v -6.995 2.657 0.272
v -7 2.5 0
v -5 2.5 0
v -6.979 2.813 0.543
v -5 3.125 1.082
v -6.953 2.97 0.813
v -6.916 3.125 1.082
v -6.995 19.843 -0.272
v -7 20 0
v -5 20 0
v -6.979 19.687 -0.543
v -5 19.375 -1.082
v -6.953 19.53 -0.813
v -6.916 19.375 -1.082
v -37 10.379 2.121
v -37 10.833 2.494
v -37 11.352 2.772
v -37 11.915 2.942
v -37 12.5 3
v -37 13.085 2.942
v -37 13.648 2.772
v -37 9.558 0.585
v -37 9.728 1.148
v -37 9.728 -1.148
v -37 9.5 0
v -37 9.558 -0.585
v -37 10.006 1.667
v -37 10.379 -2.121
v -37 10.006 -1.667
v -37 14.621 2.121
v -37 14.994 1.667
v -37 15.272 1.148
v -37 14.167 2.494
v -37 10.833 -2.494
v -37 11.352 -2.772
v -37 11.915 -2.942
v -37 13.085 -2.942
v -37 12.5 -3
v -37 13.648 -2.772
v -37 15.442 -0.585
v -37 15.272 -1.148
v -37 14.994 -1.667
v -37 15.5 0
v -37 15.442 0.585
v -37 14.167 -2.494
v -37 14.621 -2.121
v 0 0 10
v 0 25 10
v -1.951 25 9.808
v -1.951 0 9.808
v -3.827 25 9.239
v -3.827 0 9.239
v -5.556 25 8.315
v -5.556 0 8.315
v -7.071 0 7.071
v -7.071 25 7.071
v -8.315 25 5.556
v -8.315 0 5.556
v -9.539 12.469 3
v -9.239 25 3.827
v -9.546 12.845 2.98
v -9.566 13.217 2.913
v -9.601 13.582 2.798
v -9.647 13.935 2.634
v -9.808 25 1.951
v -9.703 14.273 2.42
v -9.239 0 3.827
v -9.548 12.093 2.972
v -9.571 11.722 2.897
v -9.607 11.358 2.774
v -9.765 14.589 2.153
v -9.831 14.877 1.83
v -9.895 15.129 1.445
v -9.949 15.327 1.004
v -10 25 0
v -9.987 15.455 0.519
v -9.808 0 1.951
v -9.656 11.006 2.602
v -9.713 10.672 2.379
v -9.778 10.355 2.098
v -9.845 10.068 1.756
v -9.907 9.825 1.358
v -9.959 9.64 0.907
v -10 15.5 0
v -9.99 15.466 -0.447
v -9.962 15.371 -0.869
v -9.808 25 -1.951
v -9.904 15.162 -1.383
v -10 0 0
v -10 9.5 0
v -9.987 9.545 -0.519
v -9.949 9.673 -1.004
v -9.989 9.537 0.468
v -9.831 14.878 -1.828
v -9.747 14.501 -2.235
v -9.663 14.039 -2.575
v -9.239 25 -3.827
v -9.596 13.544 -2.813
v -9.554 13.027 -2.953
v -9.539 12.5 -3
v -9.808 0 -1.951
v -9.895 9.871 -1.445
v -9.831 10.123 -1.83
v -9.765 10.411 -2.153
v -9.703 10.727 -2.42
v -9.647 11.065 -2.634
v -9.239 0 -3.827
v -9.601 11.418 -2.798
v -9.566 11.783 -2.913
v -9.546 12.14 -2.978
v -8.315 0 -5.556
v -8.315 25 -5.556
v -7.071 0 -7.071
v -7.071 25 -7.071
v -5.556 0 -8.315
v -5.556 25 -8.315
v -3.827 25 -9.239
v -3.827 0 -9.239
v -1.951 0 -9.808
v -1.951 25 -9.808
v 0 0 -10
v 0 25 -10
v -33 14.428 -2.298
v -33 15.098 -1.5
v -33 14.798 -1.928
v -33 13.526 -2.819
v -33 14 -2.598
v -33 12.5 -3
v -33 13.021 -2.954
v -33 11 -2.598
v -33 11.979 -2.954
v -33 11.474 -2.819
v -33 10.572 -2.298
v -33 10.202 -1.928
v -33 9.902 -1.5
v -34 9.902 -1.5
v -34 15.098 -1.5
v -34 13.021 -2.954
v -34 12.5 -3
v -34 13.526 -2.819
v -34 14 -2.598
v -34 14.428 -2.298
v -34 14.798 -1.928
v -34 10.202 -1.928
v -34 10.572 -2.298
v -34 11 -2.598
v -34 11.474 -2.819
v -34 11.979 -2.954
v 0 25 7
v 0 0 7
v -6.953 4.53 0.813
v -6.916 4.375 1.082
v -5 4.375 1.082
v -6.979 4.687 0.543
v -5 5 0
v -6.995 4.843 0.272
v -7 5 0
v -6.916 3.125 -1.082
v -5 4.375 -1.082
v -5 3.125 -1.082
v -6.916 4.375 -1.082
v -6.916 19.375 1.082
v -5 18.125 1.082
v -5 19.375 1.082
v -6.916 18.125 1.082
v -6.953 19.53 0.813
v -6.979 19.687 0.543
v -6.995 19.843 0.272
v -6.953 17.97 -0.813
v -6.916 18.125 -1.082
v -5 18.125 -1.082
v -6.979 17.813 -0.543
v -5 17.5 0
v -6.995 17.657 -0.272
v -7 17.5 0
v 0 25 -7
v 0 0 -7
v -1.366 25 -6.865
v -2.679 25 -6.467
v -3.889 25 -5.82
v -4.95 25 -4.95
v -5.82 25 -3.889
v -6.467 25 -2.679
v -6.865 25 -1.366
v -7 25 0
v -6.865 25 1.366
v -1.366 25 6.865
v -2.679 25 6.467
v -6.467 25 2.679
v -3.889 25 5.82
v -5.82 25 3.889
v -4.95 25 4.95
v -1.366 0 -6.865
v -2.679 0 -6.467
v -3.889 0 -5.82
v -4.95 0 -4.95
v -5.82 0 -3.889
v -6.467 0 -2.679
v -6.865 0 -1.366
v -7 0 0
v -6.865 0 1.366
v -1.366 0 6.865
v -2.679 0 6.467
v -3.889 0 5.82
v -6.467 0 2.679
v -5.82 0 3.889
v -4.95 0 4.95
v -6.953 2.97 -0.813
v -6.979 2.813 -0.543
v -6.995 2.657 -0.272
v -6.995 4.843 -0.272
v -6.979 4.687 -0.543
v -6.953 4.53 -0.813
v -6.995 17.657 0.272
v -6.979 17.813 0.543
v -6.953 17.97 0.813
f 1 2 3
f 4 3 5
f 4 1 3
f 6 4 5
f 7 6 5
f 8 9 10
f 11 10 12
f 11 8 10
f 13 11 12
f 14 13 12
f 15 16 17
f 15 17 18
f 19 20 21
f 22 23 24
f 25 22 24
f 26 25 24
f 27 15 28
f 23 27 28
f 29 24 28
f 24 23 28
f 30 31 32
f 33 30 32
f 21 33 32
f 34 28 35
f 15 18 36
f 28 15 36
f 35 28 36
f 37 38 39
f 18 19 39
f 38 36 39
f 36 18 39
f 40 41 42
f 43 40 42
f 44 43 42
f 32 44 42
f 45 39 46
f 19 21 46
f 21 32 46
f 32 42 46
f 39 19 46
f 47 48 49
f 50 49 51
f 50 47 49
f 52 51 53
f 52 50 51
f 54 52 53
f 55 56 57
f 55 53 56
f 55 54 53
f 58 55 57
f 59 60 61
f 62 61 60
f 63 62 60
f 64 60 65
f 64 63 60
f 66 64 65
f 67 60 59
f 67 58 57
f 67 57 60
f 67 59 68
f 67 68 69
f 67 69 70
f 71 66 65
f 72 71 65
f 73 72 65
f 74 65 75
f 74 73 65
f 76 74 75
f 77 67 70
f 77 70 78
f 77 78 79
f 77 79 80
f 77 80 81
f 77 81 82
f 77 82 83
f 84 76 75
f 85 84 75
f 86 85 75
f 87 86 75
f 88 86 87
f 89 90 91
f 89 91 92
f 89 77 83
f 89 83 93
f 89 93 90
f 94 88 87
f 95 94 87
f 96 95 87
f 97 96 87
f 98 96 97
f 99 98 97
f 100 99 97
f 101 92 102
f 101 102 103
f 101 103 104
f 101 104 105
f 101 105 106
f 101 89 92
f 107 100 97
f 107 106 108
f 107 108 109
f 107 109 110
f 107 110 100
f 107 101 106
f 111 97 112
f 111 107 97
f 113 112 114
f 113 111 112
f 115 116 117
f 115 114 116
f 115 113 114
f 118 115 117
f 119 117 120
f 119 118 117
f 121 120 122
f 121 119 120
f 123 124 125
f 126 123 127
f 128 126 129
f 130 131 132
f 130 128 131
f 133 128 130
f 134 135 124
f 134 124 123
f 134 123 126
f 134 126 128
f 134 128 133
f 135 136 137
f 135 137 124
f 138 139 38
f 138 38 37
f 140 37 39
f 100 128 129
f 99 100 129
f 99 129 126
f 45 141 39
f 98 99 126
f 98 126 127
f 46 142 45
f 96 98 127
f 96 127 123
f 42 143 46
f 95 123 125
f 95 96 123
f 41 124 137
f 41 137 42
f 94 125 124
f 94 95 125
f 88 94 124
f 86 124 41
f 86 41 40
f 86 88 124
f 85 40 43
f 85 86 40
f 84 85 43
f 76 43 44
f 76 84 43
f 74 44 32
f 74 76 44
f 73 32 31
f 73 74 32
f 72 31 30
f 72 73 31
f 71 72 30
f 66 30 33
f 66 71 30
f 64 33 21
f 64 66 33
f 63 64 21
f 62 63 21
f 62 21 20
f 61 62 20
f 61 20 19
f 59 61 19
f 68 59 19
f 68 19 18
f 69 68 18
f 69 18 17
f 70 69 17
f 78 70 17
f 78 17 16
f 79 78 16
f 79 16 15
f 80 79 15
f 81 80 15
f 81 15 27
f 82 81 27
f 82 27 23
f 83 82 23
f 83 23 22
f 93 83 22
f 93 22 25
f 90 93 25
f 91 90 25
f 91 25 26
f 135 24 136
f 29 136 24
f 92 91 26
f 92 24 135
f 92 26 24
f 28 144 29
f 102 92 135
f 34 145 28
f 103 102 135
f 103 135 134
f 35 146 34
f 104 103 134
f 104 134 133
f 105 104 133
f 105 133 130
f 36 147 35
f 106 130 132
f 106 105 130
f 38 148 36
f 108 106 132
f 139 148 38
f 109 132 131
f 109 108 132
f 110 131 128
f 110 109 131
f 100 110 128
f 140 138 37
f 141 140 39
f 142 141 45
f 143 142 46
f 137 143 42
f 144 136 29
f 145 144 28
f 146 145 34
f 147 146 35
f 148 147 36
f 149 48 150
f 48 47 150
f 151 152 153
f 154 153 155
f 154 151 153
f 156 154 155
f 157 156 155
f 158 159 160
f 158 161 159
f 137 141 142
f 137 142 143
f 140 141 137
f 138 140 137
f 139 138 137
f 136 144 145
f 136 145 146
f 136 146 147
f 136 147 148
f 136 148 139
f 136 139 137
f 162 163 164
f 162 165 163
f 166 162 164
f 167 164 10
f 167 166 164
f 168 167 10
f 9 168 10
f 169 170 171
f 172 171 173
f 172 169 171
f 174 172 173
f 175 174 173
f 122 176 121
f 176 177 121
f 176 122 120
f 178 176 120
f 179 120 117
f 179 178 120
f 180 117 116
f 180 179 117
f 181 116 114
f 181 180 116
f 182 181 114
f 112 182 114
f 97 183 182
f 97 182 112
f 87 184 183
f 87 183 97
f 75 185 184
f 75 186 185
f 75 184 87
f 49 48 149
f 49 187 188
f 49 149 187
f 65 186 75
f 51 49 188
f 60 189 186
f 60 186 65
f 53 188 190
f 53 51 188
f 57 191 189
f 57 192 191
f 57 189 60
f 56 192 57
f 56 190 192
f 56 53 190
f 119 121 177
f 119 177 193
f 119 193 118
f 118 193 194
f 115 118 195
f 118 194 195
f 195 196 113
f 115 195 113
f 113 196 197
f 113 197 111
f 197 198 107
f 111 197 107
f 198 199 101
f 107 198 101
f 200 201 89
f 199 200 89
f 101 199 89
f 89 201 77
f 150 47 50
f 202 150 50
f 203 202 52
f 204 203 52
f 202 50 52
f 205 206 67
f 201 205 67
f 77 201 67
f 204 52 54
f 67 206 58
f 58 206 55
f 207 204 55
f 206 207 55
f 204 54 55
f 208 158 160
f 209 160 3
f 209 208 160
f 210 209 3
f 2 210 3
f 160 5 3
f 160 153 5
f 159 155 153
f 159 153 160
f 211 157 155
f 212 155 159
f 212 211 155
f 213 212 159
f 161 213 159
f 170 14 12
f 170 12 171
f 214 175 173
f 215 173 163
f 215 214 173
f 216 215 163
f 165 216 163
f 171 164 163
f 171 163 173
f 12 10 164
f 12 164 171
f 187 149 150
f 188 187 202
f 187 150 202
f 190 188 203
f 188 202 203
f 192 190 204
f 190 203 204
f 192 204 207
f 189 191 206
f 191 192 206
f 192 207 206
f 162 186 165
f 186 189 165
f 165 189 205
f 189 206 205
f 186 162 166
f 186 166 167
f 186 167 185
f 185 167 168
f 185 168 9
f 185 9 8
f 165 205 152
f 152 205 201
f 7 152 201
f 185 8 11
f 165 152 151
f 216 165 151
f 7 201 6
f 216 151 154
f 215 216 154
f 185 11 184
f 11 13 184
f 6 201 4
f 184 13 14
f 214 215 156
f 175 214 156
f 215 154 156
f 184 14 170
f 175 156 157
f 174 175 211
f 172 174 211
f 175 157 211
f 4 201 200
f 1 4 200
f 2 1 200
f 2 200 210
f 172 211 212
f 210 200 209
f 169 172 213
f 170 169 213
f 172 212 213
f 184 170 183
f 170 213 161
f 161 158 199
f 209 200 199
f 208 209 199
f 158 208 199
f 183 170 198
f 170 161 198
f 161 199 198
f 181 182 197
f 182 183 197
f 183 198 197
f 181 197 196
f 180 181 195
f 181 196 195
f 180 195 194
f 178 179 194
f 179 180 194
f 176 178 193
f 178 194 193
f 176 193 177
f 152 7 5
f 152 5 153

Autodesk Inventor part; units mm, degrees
ref_plane "YZ Plane" through (0, 0, 0) normal (1, 0, 0) x (0, 1, 0)
ref_plane "XZ Plane" through (0, 0, 0) normal (0, 1, 0) x (-1, 0, 0)
ref_plane "XY Plane" through (0, 0, 0) normal (0, 0, 1) x (1, 0, 0)
sketch "Sketch1" plane through (0, 0, 0) normal (0, 1, 0) x (-1, 0, 0)
  circle A0 centre (0, 0) radius 7
  circle A1 centre (0, 0) radius 10
  line L0 (0, 11.563) -> (0, -13.4764)
  point P0 (0, -7)
  point P1 (0, -10)
  point P2 (0, 10)
  point P3 (0, 7)
  dimension "d0" = 14
  dimension "d1" = 20
extrude "Extrusion1" add sketch "Sketch1" along normal blind 25 contours A0 L0 A1 picked at (8.8579, -1.261)
sketch "Sketch2" plane through (0, 25, 0) normal (0, 1, 0) x (1, 0, 0)
  arc A0 (0, 7) -> (0, -7) centre (0, 0) ccw projected
  point P0 (-7, 0)
ref_plane "Work Plane1" through (-7, 25, 0) normal (1, 0, 0) x (0, 0, -1)
sketch "Sketch3" plane through (-7, 25, 0) normal (1, 0, 0) x (0, 0, -1)
  line L0 (10, 0) -> (-10, 0) projected
  line L1 (0, 0) -> (0, -5)
  line L2 (0, -5) -> (0, -6.25)
  line L3 (0, -5) -> (1.0825, -5.625)
  line L4 (1.0825, -5.625) -> (1.0825, -6.875)
  line L5 (1.0825, -6.875) -> (0, -7.5)
  line L6 (0, -7.5) -> (-1.0825, -6.875)
  line L7 (-1.0825, -6.875) -> (-1.0825, -5.625)
  line L8 (-1.0825, -5.625) -> (0, -5)
  line L9 (0, -6.25) -> (0, -21.25)
  line L10 (0, -21.25) -> (0, -22.5)
  line L11 (0, -22.5) -> (-1.0825, -21.875)
  line L12 (-1.0825, -21.875) -> (-1.0825, -20.625)
  line L13 (-1.0825, -20.625) -> (0, -20)
  line L14 (0, -20) -> (1.0825, -20.625)
  line L15 (1.0825, -20.625) -> (1.0825, -21.875)
  line L16 (1.0825, -21.875) -> (0, -22.5)
  point P0 (0, -25)
  dimension "d4" = 5
  dimension "d5" = 1.25
  dimension "d6" = 15
  dimension "d7" = 1.25
extrude "Extrusion2" add sketch "Sketch3" along normal blind 2
sketch "Sketch4" plane through (-7, 25, 0) normal (1, 0, 0) x (0, 0, -1)
  line L0 (0, -25) -> (0, 0)
  line L1 (-7, 0) -> (7, 0) projected
  line L2 (0, -12.5) -> (-3, -12.5)
  circle A0 centre (0, -12.5) radius 3
  dimension "d10" = 3
extrude "Extrusion3" add sketch "Sketch4" against normal blind 30
sketch "Sketch5" plane through (0, 0, 0) normal (0, -1, 0) x (1, 0, 0)
  line L0 (-37, 3) -> (-37, -3) projected
  line L1 (-37, -3) -> (-34, -3)
  line L2 (-9.5394, -3) -> (-37, -3) projected
  line L3 (-34, -3) -> (-34, 0)
  line L4 (-34, 0) -> (-34, -1.5)
  line L5 (-34, -1.5) -> (-33, -1.5)
  line L6 (-33, -1.5) -> (-33, -3)
  line L7 (-33, -3) -> (-34.954, -5.8523)
  line L8 (-34.954, -5.8523) -> (-37, -3)
  point P0 (0, 0)
  point P1 (-9.5394, 3)
  dimension "d13" = 3
  dimension "d14" = 1
extrude "Extrusion4" cut sketch "Sketch5" against normal through all
sketch "Sketch6" plane through (0, 0, 0) normal (0, -1, 0) x (1, 0, 0)
  point P0 (0, 0)
properties part number "medidor_torque_palanca"
